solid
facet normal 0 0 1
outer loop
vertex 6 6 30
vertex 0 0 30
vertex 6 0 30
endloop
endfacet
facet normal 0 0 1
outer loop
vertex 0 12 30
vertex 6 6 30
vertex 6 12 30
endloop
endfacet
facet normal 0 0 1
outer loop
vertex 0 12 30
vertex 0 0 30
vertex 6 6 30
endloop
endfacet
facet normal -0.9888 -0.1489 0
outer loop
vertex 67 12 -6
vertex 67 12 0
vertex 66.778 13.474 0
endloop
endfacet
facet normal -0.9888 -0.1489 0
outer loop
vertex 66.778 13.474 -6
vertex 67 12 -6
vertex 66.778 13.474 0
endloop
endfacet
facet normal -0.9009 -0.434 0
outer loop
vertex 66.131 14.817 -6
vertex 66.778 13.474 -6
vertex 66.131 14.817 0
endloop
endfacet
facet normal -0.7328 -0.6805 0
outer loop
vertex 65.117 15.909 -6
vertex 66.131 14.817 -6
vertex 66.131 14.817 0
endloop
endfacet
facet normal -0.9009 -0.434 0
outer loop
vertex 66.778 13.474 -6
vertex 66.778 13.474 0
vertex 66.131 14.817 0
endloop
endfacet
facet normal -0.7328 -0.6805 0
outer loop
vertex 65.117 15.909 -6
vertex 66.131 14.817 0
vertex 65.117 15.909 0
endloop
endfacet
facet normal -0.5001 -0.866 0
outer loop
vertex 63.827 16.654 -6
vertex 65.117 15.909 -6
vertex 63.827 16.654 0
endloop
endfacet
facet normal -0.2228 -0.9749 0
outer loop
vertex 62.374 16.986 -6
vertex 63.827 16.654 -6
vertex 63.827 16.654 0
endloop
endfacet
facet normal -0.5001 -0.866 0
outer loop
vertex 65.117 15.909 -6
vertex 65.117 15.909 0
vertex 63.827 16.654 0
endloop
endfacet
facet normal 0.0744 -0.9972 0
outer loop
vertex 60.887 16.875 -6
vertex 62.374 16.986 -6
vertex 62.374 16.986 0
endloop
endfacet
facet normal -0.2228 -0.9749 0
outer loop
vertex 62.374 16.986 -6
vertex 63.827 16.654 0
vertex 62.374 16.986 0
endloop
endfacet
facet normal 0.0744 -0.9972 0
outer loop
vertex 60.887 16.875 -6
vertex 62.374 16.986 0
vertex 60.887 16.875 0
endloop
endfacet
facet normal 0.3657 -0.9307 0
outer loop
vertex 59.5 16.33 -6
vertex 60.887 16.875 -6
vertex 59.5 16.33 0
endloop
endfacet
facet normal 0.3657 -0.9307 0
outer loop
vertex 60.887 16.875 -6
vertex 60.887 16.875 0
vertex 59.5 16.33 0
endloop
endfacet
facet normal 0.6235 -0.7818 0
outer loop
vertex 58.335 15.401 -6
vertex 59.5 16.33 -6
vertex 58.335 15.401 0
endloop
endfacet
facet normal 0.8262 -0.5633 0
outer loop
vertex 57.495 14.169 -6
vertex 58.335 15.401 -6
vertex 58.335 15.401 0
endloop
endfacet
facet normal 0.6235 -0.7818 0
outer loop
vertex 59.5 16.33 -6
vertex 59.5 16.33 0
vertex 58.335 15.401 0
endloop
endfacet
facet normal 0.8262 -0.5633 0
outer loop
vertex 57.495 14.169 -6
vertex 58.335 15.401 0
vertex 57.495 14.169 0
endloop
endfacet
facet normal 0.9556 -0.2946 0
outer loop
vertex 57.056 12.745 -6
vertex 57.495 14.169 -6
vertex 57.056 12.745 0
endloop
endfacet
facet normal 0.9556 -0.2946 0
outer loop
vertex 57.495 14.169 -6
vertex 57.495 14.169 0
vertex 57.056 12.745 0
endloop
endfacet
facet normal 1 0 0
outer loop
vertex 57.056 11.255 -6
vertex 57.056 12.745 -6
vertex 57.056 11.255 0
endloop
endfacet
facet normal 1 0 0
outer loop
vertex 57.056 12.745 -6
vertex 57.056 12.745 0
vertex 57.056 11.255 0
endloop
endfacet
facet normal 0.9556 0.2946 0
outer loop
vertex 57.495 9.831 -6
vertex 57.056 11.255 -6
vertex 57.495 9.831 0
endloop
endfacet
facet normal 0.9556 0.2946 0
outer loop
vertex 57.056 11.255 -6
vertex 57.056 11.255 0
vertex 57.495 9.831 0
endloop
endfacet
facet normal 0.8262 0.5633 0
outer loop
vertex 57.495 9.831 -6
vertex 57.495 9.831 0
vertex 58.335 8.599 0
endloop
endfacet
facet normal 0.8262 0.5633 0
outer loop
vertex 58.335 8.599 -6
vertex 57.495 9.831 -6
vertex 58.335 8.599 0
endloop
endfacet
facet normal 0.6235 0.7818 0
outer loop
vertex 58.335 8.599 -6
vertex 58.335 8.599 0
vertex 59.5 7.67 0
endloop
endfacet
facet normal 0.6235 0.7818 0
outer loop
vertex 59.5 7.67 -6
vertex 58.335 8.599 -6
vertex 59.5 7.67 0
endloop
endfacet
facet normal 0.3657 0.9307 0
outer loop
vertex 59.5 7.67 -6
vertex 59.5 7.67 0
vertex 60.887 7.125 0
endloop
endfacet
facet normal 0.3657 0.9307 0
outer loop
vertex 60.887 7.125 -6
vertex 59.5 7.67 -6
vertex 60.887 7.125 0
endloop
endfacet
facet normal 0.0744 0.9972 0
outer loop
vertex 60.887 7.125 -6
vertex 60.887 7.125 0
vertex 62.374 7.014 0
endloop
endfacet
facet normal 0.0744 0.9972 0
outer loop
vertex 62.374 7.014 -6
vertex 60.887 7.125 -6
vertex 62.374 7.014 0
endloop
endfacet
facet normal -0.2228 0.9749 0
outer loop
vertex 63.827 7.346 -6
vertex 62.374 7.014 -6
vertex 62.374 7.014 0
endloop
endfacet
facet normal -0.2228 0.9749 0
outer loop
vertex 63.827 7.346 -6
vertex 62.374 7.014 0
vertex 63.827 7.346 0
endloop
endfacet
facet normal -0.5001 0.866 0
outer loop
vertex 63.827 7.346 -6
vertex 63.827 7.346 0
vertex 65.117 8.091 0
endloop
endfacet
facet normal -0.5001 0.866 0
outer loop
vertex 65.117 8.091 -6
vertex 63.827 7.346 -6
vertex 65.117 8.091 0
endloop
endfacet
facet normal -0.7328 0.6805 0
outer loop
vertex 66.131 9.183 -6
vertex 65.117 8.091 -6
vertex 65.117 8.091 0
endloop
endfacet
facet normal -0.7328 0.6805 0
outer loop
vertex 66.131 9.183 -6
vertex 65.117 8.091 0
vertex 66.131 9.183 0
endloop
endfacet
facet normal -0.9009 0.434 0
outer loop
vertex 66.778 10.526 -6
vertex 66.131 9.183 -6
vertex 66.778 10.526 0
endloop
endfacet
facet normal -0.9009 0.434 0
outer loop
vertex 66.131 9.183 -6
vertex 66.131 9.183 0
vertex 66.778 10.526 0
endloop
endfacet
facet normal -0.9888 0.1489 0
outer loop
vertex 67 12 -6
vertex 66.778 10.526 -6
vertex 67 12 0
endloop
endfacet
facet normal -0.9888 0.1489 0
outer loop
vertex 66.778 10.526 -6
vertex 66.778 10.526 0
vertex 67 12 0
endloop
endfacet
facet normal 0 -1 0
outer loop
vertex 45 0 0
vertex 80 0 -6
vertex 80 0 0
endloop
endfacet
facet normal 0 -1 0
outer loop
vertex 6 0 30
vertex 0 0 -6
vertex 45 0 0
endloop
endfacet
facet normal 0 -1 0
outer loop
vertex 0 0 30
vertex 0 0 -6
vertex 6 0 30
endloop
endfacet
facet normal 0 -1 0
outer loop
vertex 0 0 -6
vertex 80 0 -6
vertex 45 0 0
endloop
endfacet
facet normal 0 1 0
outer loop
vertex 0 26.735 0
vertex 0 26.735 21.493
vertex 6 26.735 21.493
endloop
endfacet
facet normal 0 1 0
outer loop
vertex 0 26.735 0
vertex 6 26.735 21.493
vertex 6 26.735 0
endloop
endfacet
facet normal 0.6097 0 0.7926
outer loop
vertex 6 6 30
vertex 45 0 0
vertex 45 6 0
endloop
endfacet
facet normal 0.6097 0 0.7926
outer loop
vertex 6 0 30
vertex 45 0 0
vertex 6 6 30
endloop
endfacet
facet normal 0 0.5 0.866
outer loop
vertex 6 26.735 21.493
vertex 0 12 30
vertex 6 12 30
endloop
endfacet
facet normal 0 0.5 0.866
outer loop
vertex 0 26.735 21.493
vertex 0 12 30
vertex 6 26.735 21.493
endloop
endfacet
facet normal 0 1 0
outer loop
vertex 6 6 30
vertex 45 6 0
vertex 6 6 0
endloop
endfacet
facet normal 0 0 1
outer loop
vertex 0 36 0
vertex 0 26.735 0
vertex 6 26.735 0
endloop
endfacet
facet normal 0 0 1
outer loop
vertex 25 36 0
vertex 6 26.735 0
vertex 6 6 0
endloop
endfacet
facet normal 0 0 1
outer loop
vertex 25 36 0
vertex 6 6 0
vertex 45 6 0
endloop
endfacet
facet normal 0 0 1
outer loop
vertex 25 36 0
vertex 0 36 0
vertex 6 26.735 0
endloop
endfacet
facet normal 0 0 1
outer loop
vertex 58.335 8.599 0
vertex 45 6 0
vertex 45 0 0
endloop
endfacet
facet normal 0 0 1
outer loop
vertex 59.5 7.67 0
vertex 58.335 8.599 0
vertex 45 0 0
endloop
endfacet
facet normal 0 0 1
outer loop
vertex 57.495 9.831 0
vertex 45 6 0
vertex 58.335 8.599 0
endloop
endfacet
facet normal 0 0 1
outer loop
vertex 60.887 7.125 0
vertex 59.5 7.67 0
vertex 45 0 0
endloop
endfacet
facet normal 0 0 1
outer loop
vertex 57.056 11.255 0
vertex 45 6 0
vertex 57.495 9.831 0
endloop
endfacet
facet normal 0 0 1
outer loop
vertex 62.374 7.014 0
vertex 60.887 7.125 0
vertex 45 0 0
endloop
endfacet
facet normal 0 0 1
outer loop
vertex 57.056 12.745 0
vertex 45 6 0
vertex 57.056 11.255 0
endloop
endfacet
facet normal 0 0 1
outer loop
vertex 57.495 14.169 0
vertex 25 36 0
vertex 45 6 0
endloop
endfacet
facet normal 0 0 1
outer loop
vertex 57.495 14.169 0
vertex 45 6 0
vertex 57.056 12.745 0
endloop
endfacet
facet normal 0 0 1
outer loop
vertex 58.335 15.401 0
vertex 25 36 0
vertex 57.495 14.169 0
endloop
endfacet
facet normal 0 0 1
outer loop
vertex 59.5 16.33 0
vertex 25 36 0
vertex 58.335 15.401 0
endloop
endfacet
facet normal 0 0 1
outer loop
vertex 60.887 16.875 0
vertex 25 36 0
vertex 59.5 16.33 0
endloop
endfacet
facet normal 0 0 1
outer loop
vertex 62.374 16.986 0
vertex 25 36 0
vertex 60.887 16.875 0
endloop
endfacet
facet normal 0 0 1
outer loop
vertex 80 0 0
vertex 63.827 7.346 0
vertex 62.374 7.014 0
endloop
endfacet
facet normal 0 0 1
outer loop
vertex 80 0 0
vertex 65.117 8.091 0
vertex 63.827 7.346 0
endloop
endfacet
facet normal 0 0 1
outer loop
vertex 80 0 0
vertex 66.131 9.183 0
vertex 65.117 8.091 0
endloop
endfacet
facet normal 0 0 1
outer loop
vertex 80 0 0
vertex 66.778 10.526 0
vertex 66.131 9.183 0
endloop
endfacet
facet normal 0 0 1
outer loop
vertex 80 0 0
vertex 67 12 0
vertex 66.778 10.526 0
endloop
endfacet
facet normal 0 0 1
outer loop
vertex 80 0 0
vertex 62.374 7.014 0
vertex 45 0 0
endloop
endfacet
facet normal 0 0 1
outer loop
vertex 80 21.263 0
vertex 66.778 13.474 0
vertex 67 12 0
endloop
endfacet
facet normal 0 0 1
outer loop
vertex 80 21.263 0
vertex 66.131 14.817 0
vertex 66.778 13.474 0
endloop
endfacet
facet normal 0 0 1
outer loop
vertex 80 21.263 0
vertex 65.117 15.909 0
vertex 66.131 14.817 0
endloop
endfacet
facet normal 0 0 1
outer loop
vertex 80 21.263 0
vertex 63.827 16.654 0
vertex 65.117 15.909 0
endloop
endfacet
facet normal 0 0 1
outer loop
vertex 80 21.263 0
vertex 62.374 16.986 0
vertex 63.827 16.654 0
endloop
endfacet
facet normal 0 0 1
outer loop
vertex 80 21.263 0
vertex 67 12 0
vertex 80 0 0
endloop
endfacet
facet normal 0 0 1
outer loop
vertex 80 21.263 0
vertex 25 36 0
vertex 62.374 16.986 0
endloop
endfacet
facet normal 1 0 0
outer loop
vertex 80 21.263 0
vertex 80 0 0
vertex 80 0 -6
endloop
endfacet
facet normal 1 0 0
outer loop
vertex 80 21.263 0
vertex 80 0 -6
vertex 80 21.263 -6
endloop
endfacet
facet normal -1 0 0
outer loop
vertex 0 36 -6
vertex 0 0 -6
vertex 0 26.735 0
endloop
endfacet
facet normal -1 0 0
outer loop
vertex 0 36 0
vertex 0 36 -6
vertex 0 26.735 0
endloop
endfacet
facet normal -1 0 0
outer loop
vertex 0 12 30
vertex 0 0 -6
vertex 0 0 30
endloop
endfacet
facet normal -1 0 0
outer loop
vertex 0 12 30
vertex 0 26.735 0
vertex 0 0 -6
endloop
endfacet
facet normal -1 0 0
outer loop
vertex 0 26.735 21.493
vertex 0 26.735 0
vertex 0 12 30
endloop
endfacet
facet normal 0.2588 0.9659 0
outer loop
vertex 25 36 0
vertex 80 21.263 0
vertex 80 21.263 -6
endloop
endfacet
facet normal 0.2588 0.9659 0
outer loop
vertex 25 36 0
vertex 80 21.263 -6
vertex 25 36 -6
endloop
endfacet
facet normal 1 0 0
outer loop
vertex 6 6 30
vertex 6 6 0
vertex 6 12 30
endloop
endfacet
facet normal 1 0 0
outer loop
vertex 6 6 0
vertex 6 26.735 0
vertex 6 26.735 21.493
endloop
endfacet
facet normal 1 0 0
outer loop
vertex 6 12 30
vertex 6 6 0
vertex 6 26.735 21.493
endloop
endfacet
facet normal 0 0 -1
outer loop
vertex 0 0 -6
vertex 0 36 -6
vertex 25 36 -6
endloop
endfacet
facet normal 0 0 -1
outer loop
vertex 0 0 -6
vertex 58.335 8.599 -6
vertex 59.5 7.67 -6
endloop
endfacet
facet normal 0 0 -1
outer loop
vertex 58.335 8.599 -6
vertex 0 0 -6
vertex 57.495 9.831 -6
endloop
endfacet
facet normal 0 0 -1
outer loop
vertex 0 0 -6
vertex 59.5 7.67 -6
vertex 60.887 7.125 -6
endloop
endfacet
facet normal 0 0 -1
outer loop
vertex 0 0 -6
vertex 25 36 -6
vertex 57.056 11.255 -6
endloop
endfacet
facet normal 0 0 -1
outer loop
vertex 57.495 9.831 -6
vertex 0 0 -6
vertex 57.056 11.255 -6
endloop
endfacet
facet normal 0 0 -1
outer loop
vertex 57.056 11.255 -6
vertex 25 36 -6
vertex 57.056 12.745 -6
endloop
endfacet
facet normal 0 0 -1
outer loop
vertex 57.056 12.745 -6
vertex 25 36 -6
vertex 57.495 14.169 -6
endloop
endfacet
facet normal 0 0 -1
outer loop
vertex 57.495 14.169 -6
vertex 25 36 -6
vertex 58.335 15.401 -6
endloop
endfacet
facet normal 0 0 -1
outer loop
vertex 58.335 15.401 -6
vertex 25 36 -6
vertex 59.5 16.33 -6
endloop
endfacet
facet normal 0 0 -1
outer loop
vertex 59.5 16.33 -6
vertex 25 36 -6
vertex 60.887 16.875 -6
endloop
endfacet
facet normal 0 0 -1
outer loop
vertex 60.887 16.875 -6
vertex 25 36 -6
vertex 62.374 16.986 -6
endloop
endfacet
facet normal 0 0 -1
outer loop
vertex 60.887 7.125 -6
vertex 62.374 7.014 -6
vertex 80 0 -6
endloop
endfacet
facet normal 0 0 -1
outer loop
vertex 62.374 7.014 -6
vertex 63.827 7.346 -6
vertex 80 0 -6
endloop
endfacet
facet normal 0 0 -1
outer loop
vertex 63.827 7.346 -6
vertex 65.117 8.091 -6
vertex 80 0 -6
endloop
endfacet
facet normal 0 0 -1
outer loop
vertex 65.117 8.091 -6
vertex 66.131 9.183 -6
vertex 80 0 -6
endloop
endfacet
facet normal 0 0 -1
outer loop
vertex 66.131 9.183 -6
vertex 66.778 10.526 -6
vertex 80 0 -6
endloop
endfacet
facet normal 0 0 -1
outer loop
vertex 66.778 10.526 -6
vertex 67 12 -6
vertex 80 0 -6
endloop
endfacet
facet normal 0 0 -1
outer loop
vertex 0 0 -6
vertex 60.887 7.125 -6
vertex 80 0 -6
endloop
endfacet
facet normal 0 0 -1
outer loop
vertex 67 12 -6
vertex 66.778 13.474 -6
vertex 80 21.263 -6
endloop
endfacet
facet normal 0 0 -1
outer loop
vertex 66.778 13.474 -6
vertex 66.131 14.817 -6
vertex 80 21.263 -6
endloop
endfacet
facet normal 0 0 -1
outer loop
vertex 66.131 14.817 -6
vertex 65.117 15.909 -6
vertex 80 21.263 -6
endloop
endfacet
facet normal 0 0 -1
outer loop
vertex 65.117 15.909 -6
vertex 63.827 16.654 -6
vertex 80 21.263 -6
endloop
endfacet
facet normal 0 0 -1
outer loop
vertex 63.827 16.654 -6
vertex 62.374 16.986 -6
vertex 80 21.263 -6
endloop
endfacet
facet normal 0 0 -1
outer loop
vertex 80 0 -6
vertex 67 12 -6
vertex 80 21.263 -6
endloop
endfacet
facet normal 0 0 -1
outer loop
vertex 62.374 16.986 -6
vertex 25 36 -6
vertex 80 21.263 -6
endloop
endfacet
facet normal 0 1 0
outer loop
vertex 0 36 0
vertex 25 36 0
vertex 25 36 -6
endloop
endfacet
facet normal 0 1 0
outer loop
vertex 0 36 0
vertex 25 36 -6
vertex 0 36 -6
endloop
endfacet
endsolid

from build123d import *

# Parameters (mm, degrees)
SKETCH_1_R      = 5
EXTRUDE_1_DEPTH = 6
EXTRUDE_2_DEPTH = 6
EXTRUDE_3_DEPTH = 6


with BuildPart() as part:
    # 草圖1 → 填料-伸長1 (new body)
    with BuildSketch(Plane.XY):
        Polygon((0, 0), (80, 0), (80, 21.262794416), (25, 36), (0, 36), align=None)
        with Locations((62, 12)):
            Circle(SKETCH_1_R, mode=Mode.SUBTRACT)
    extrude(amount=-EXTRUDE_1_DEPTH)

    # 草圖2 → 填料-伸長2 (add)
    with BuildSketch(Plane(origin=(0, 0, 0), x_dir=(0, 0, -1), z_dir=(1, 0, 0))):
        Polygon((0, 0), (-30, 0), (-30, 12), (-21.492830392, 26.73484999), (0, 26.73484999), align=None)
    extrude(amount=EXTRUDE_2_DEPTH)

    # 草圖3 → 填料-伸長3 (add)
    with BuildSketch(Plane(origin=(0, 0, 0), x_dir=(1, 0, 0), z_dir=(0, 1, 0))):
        Polygon((0, 0), (45, 0), (6, -30), (0, -30), align=None)
    extrude(amount=EXTRUDE_3_DEPTH)


solid = part.part
